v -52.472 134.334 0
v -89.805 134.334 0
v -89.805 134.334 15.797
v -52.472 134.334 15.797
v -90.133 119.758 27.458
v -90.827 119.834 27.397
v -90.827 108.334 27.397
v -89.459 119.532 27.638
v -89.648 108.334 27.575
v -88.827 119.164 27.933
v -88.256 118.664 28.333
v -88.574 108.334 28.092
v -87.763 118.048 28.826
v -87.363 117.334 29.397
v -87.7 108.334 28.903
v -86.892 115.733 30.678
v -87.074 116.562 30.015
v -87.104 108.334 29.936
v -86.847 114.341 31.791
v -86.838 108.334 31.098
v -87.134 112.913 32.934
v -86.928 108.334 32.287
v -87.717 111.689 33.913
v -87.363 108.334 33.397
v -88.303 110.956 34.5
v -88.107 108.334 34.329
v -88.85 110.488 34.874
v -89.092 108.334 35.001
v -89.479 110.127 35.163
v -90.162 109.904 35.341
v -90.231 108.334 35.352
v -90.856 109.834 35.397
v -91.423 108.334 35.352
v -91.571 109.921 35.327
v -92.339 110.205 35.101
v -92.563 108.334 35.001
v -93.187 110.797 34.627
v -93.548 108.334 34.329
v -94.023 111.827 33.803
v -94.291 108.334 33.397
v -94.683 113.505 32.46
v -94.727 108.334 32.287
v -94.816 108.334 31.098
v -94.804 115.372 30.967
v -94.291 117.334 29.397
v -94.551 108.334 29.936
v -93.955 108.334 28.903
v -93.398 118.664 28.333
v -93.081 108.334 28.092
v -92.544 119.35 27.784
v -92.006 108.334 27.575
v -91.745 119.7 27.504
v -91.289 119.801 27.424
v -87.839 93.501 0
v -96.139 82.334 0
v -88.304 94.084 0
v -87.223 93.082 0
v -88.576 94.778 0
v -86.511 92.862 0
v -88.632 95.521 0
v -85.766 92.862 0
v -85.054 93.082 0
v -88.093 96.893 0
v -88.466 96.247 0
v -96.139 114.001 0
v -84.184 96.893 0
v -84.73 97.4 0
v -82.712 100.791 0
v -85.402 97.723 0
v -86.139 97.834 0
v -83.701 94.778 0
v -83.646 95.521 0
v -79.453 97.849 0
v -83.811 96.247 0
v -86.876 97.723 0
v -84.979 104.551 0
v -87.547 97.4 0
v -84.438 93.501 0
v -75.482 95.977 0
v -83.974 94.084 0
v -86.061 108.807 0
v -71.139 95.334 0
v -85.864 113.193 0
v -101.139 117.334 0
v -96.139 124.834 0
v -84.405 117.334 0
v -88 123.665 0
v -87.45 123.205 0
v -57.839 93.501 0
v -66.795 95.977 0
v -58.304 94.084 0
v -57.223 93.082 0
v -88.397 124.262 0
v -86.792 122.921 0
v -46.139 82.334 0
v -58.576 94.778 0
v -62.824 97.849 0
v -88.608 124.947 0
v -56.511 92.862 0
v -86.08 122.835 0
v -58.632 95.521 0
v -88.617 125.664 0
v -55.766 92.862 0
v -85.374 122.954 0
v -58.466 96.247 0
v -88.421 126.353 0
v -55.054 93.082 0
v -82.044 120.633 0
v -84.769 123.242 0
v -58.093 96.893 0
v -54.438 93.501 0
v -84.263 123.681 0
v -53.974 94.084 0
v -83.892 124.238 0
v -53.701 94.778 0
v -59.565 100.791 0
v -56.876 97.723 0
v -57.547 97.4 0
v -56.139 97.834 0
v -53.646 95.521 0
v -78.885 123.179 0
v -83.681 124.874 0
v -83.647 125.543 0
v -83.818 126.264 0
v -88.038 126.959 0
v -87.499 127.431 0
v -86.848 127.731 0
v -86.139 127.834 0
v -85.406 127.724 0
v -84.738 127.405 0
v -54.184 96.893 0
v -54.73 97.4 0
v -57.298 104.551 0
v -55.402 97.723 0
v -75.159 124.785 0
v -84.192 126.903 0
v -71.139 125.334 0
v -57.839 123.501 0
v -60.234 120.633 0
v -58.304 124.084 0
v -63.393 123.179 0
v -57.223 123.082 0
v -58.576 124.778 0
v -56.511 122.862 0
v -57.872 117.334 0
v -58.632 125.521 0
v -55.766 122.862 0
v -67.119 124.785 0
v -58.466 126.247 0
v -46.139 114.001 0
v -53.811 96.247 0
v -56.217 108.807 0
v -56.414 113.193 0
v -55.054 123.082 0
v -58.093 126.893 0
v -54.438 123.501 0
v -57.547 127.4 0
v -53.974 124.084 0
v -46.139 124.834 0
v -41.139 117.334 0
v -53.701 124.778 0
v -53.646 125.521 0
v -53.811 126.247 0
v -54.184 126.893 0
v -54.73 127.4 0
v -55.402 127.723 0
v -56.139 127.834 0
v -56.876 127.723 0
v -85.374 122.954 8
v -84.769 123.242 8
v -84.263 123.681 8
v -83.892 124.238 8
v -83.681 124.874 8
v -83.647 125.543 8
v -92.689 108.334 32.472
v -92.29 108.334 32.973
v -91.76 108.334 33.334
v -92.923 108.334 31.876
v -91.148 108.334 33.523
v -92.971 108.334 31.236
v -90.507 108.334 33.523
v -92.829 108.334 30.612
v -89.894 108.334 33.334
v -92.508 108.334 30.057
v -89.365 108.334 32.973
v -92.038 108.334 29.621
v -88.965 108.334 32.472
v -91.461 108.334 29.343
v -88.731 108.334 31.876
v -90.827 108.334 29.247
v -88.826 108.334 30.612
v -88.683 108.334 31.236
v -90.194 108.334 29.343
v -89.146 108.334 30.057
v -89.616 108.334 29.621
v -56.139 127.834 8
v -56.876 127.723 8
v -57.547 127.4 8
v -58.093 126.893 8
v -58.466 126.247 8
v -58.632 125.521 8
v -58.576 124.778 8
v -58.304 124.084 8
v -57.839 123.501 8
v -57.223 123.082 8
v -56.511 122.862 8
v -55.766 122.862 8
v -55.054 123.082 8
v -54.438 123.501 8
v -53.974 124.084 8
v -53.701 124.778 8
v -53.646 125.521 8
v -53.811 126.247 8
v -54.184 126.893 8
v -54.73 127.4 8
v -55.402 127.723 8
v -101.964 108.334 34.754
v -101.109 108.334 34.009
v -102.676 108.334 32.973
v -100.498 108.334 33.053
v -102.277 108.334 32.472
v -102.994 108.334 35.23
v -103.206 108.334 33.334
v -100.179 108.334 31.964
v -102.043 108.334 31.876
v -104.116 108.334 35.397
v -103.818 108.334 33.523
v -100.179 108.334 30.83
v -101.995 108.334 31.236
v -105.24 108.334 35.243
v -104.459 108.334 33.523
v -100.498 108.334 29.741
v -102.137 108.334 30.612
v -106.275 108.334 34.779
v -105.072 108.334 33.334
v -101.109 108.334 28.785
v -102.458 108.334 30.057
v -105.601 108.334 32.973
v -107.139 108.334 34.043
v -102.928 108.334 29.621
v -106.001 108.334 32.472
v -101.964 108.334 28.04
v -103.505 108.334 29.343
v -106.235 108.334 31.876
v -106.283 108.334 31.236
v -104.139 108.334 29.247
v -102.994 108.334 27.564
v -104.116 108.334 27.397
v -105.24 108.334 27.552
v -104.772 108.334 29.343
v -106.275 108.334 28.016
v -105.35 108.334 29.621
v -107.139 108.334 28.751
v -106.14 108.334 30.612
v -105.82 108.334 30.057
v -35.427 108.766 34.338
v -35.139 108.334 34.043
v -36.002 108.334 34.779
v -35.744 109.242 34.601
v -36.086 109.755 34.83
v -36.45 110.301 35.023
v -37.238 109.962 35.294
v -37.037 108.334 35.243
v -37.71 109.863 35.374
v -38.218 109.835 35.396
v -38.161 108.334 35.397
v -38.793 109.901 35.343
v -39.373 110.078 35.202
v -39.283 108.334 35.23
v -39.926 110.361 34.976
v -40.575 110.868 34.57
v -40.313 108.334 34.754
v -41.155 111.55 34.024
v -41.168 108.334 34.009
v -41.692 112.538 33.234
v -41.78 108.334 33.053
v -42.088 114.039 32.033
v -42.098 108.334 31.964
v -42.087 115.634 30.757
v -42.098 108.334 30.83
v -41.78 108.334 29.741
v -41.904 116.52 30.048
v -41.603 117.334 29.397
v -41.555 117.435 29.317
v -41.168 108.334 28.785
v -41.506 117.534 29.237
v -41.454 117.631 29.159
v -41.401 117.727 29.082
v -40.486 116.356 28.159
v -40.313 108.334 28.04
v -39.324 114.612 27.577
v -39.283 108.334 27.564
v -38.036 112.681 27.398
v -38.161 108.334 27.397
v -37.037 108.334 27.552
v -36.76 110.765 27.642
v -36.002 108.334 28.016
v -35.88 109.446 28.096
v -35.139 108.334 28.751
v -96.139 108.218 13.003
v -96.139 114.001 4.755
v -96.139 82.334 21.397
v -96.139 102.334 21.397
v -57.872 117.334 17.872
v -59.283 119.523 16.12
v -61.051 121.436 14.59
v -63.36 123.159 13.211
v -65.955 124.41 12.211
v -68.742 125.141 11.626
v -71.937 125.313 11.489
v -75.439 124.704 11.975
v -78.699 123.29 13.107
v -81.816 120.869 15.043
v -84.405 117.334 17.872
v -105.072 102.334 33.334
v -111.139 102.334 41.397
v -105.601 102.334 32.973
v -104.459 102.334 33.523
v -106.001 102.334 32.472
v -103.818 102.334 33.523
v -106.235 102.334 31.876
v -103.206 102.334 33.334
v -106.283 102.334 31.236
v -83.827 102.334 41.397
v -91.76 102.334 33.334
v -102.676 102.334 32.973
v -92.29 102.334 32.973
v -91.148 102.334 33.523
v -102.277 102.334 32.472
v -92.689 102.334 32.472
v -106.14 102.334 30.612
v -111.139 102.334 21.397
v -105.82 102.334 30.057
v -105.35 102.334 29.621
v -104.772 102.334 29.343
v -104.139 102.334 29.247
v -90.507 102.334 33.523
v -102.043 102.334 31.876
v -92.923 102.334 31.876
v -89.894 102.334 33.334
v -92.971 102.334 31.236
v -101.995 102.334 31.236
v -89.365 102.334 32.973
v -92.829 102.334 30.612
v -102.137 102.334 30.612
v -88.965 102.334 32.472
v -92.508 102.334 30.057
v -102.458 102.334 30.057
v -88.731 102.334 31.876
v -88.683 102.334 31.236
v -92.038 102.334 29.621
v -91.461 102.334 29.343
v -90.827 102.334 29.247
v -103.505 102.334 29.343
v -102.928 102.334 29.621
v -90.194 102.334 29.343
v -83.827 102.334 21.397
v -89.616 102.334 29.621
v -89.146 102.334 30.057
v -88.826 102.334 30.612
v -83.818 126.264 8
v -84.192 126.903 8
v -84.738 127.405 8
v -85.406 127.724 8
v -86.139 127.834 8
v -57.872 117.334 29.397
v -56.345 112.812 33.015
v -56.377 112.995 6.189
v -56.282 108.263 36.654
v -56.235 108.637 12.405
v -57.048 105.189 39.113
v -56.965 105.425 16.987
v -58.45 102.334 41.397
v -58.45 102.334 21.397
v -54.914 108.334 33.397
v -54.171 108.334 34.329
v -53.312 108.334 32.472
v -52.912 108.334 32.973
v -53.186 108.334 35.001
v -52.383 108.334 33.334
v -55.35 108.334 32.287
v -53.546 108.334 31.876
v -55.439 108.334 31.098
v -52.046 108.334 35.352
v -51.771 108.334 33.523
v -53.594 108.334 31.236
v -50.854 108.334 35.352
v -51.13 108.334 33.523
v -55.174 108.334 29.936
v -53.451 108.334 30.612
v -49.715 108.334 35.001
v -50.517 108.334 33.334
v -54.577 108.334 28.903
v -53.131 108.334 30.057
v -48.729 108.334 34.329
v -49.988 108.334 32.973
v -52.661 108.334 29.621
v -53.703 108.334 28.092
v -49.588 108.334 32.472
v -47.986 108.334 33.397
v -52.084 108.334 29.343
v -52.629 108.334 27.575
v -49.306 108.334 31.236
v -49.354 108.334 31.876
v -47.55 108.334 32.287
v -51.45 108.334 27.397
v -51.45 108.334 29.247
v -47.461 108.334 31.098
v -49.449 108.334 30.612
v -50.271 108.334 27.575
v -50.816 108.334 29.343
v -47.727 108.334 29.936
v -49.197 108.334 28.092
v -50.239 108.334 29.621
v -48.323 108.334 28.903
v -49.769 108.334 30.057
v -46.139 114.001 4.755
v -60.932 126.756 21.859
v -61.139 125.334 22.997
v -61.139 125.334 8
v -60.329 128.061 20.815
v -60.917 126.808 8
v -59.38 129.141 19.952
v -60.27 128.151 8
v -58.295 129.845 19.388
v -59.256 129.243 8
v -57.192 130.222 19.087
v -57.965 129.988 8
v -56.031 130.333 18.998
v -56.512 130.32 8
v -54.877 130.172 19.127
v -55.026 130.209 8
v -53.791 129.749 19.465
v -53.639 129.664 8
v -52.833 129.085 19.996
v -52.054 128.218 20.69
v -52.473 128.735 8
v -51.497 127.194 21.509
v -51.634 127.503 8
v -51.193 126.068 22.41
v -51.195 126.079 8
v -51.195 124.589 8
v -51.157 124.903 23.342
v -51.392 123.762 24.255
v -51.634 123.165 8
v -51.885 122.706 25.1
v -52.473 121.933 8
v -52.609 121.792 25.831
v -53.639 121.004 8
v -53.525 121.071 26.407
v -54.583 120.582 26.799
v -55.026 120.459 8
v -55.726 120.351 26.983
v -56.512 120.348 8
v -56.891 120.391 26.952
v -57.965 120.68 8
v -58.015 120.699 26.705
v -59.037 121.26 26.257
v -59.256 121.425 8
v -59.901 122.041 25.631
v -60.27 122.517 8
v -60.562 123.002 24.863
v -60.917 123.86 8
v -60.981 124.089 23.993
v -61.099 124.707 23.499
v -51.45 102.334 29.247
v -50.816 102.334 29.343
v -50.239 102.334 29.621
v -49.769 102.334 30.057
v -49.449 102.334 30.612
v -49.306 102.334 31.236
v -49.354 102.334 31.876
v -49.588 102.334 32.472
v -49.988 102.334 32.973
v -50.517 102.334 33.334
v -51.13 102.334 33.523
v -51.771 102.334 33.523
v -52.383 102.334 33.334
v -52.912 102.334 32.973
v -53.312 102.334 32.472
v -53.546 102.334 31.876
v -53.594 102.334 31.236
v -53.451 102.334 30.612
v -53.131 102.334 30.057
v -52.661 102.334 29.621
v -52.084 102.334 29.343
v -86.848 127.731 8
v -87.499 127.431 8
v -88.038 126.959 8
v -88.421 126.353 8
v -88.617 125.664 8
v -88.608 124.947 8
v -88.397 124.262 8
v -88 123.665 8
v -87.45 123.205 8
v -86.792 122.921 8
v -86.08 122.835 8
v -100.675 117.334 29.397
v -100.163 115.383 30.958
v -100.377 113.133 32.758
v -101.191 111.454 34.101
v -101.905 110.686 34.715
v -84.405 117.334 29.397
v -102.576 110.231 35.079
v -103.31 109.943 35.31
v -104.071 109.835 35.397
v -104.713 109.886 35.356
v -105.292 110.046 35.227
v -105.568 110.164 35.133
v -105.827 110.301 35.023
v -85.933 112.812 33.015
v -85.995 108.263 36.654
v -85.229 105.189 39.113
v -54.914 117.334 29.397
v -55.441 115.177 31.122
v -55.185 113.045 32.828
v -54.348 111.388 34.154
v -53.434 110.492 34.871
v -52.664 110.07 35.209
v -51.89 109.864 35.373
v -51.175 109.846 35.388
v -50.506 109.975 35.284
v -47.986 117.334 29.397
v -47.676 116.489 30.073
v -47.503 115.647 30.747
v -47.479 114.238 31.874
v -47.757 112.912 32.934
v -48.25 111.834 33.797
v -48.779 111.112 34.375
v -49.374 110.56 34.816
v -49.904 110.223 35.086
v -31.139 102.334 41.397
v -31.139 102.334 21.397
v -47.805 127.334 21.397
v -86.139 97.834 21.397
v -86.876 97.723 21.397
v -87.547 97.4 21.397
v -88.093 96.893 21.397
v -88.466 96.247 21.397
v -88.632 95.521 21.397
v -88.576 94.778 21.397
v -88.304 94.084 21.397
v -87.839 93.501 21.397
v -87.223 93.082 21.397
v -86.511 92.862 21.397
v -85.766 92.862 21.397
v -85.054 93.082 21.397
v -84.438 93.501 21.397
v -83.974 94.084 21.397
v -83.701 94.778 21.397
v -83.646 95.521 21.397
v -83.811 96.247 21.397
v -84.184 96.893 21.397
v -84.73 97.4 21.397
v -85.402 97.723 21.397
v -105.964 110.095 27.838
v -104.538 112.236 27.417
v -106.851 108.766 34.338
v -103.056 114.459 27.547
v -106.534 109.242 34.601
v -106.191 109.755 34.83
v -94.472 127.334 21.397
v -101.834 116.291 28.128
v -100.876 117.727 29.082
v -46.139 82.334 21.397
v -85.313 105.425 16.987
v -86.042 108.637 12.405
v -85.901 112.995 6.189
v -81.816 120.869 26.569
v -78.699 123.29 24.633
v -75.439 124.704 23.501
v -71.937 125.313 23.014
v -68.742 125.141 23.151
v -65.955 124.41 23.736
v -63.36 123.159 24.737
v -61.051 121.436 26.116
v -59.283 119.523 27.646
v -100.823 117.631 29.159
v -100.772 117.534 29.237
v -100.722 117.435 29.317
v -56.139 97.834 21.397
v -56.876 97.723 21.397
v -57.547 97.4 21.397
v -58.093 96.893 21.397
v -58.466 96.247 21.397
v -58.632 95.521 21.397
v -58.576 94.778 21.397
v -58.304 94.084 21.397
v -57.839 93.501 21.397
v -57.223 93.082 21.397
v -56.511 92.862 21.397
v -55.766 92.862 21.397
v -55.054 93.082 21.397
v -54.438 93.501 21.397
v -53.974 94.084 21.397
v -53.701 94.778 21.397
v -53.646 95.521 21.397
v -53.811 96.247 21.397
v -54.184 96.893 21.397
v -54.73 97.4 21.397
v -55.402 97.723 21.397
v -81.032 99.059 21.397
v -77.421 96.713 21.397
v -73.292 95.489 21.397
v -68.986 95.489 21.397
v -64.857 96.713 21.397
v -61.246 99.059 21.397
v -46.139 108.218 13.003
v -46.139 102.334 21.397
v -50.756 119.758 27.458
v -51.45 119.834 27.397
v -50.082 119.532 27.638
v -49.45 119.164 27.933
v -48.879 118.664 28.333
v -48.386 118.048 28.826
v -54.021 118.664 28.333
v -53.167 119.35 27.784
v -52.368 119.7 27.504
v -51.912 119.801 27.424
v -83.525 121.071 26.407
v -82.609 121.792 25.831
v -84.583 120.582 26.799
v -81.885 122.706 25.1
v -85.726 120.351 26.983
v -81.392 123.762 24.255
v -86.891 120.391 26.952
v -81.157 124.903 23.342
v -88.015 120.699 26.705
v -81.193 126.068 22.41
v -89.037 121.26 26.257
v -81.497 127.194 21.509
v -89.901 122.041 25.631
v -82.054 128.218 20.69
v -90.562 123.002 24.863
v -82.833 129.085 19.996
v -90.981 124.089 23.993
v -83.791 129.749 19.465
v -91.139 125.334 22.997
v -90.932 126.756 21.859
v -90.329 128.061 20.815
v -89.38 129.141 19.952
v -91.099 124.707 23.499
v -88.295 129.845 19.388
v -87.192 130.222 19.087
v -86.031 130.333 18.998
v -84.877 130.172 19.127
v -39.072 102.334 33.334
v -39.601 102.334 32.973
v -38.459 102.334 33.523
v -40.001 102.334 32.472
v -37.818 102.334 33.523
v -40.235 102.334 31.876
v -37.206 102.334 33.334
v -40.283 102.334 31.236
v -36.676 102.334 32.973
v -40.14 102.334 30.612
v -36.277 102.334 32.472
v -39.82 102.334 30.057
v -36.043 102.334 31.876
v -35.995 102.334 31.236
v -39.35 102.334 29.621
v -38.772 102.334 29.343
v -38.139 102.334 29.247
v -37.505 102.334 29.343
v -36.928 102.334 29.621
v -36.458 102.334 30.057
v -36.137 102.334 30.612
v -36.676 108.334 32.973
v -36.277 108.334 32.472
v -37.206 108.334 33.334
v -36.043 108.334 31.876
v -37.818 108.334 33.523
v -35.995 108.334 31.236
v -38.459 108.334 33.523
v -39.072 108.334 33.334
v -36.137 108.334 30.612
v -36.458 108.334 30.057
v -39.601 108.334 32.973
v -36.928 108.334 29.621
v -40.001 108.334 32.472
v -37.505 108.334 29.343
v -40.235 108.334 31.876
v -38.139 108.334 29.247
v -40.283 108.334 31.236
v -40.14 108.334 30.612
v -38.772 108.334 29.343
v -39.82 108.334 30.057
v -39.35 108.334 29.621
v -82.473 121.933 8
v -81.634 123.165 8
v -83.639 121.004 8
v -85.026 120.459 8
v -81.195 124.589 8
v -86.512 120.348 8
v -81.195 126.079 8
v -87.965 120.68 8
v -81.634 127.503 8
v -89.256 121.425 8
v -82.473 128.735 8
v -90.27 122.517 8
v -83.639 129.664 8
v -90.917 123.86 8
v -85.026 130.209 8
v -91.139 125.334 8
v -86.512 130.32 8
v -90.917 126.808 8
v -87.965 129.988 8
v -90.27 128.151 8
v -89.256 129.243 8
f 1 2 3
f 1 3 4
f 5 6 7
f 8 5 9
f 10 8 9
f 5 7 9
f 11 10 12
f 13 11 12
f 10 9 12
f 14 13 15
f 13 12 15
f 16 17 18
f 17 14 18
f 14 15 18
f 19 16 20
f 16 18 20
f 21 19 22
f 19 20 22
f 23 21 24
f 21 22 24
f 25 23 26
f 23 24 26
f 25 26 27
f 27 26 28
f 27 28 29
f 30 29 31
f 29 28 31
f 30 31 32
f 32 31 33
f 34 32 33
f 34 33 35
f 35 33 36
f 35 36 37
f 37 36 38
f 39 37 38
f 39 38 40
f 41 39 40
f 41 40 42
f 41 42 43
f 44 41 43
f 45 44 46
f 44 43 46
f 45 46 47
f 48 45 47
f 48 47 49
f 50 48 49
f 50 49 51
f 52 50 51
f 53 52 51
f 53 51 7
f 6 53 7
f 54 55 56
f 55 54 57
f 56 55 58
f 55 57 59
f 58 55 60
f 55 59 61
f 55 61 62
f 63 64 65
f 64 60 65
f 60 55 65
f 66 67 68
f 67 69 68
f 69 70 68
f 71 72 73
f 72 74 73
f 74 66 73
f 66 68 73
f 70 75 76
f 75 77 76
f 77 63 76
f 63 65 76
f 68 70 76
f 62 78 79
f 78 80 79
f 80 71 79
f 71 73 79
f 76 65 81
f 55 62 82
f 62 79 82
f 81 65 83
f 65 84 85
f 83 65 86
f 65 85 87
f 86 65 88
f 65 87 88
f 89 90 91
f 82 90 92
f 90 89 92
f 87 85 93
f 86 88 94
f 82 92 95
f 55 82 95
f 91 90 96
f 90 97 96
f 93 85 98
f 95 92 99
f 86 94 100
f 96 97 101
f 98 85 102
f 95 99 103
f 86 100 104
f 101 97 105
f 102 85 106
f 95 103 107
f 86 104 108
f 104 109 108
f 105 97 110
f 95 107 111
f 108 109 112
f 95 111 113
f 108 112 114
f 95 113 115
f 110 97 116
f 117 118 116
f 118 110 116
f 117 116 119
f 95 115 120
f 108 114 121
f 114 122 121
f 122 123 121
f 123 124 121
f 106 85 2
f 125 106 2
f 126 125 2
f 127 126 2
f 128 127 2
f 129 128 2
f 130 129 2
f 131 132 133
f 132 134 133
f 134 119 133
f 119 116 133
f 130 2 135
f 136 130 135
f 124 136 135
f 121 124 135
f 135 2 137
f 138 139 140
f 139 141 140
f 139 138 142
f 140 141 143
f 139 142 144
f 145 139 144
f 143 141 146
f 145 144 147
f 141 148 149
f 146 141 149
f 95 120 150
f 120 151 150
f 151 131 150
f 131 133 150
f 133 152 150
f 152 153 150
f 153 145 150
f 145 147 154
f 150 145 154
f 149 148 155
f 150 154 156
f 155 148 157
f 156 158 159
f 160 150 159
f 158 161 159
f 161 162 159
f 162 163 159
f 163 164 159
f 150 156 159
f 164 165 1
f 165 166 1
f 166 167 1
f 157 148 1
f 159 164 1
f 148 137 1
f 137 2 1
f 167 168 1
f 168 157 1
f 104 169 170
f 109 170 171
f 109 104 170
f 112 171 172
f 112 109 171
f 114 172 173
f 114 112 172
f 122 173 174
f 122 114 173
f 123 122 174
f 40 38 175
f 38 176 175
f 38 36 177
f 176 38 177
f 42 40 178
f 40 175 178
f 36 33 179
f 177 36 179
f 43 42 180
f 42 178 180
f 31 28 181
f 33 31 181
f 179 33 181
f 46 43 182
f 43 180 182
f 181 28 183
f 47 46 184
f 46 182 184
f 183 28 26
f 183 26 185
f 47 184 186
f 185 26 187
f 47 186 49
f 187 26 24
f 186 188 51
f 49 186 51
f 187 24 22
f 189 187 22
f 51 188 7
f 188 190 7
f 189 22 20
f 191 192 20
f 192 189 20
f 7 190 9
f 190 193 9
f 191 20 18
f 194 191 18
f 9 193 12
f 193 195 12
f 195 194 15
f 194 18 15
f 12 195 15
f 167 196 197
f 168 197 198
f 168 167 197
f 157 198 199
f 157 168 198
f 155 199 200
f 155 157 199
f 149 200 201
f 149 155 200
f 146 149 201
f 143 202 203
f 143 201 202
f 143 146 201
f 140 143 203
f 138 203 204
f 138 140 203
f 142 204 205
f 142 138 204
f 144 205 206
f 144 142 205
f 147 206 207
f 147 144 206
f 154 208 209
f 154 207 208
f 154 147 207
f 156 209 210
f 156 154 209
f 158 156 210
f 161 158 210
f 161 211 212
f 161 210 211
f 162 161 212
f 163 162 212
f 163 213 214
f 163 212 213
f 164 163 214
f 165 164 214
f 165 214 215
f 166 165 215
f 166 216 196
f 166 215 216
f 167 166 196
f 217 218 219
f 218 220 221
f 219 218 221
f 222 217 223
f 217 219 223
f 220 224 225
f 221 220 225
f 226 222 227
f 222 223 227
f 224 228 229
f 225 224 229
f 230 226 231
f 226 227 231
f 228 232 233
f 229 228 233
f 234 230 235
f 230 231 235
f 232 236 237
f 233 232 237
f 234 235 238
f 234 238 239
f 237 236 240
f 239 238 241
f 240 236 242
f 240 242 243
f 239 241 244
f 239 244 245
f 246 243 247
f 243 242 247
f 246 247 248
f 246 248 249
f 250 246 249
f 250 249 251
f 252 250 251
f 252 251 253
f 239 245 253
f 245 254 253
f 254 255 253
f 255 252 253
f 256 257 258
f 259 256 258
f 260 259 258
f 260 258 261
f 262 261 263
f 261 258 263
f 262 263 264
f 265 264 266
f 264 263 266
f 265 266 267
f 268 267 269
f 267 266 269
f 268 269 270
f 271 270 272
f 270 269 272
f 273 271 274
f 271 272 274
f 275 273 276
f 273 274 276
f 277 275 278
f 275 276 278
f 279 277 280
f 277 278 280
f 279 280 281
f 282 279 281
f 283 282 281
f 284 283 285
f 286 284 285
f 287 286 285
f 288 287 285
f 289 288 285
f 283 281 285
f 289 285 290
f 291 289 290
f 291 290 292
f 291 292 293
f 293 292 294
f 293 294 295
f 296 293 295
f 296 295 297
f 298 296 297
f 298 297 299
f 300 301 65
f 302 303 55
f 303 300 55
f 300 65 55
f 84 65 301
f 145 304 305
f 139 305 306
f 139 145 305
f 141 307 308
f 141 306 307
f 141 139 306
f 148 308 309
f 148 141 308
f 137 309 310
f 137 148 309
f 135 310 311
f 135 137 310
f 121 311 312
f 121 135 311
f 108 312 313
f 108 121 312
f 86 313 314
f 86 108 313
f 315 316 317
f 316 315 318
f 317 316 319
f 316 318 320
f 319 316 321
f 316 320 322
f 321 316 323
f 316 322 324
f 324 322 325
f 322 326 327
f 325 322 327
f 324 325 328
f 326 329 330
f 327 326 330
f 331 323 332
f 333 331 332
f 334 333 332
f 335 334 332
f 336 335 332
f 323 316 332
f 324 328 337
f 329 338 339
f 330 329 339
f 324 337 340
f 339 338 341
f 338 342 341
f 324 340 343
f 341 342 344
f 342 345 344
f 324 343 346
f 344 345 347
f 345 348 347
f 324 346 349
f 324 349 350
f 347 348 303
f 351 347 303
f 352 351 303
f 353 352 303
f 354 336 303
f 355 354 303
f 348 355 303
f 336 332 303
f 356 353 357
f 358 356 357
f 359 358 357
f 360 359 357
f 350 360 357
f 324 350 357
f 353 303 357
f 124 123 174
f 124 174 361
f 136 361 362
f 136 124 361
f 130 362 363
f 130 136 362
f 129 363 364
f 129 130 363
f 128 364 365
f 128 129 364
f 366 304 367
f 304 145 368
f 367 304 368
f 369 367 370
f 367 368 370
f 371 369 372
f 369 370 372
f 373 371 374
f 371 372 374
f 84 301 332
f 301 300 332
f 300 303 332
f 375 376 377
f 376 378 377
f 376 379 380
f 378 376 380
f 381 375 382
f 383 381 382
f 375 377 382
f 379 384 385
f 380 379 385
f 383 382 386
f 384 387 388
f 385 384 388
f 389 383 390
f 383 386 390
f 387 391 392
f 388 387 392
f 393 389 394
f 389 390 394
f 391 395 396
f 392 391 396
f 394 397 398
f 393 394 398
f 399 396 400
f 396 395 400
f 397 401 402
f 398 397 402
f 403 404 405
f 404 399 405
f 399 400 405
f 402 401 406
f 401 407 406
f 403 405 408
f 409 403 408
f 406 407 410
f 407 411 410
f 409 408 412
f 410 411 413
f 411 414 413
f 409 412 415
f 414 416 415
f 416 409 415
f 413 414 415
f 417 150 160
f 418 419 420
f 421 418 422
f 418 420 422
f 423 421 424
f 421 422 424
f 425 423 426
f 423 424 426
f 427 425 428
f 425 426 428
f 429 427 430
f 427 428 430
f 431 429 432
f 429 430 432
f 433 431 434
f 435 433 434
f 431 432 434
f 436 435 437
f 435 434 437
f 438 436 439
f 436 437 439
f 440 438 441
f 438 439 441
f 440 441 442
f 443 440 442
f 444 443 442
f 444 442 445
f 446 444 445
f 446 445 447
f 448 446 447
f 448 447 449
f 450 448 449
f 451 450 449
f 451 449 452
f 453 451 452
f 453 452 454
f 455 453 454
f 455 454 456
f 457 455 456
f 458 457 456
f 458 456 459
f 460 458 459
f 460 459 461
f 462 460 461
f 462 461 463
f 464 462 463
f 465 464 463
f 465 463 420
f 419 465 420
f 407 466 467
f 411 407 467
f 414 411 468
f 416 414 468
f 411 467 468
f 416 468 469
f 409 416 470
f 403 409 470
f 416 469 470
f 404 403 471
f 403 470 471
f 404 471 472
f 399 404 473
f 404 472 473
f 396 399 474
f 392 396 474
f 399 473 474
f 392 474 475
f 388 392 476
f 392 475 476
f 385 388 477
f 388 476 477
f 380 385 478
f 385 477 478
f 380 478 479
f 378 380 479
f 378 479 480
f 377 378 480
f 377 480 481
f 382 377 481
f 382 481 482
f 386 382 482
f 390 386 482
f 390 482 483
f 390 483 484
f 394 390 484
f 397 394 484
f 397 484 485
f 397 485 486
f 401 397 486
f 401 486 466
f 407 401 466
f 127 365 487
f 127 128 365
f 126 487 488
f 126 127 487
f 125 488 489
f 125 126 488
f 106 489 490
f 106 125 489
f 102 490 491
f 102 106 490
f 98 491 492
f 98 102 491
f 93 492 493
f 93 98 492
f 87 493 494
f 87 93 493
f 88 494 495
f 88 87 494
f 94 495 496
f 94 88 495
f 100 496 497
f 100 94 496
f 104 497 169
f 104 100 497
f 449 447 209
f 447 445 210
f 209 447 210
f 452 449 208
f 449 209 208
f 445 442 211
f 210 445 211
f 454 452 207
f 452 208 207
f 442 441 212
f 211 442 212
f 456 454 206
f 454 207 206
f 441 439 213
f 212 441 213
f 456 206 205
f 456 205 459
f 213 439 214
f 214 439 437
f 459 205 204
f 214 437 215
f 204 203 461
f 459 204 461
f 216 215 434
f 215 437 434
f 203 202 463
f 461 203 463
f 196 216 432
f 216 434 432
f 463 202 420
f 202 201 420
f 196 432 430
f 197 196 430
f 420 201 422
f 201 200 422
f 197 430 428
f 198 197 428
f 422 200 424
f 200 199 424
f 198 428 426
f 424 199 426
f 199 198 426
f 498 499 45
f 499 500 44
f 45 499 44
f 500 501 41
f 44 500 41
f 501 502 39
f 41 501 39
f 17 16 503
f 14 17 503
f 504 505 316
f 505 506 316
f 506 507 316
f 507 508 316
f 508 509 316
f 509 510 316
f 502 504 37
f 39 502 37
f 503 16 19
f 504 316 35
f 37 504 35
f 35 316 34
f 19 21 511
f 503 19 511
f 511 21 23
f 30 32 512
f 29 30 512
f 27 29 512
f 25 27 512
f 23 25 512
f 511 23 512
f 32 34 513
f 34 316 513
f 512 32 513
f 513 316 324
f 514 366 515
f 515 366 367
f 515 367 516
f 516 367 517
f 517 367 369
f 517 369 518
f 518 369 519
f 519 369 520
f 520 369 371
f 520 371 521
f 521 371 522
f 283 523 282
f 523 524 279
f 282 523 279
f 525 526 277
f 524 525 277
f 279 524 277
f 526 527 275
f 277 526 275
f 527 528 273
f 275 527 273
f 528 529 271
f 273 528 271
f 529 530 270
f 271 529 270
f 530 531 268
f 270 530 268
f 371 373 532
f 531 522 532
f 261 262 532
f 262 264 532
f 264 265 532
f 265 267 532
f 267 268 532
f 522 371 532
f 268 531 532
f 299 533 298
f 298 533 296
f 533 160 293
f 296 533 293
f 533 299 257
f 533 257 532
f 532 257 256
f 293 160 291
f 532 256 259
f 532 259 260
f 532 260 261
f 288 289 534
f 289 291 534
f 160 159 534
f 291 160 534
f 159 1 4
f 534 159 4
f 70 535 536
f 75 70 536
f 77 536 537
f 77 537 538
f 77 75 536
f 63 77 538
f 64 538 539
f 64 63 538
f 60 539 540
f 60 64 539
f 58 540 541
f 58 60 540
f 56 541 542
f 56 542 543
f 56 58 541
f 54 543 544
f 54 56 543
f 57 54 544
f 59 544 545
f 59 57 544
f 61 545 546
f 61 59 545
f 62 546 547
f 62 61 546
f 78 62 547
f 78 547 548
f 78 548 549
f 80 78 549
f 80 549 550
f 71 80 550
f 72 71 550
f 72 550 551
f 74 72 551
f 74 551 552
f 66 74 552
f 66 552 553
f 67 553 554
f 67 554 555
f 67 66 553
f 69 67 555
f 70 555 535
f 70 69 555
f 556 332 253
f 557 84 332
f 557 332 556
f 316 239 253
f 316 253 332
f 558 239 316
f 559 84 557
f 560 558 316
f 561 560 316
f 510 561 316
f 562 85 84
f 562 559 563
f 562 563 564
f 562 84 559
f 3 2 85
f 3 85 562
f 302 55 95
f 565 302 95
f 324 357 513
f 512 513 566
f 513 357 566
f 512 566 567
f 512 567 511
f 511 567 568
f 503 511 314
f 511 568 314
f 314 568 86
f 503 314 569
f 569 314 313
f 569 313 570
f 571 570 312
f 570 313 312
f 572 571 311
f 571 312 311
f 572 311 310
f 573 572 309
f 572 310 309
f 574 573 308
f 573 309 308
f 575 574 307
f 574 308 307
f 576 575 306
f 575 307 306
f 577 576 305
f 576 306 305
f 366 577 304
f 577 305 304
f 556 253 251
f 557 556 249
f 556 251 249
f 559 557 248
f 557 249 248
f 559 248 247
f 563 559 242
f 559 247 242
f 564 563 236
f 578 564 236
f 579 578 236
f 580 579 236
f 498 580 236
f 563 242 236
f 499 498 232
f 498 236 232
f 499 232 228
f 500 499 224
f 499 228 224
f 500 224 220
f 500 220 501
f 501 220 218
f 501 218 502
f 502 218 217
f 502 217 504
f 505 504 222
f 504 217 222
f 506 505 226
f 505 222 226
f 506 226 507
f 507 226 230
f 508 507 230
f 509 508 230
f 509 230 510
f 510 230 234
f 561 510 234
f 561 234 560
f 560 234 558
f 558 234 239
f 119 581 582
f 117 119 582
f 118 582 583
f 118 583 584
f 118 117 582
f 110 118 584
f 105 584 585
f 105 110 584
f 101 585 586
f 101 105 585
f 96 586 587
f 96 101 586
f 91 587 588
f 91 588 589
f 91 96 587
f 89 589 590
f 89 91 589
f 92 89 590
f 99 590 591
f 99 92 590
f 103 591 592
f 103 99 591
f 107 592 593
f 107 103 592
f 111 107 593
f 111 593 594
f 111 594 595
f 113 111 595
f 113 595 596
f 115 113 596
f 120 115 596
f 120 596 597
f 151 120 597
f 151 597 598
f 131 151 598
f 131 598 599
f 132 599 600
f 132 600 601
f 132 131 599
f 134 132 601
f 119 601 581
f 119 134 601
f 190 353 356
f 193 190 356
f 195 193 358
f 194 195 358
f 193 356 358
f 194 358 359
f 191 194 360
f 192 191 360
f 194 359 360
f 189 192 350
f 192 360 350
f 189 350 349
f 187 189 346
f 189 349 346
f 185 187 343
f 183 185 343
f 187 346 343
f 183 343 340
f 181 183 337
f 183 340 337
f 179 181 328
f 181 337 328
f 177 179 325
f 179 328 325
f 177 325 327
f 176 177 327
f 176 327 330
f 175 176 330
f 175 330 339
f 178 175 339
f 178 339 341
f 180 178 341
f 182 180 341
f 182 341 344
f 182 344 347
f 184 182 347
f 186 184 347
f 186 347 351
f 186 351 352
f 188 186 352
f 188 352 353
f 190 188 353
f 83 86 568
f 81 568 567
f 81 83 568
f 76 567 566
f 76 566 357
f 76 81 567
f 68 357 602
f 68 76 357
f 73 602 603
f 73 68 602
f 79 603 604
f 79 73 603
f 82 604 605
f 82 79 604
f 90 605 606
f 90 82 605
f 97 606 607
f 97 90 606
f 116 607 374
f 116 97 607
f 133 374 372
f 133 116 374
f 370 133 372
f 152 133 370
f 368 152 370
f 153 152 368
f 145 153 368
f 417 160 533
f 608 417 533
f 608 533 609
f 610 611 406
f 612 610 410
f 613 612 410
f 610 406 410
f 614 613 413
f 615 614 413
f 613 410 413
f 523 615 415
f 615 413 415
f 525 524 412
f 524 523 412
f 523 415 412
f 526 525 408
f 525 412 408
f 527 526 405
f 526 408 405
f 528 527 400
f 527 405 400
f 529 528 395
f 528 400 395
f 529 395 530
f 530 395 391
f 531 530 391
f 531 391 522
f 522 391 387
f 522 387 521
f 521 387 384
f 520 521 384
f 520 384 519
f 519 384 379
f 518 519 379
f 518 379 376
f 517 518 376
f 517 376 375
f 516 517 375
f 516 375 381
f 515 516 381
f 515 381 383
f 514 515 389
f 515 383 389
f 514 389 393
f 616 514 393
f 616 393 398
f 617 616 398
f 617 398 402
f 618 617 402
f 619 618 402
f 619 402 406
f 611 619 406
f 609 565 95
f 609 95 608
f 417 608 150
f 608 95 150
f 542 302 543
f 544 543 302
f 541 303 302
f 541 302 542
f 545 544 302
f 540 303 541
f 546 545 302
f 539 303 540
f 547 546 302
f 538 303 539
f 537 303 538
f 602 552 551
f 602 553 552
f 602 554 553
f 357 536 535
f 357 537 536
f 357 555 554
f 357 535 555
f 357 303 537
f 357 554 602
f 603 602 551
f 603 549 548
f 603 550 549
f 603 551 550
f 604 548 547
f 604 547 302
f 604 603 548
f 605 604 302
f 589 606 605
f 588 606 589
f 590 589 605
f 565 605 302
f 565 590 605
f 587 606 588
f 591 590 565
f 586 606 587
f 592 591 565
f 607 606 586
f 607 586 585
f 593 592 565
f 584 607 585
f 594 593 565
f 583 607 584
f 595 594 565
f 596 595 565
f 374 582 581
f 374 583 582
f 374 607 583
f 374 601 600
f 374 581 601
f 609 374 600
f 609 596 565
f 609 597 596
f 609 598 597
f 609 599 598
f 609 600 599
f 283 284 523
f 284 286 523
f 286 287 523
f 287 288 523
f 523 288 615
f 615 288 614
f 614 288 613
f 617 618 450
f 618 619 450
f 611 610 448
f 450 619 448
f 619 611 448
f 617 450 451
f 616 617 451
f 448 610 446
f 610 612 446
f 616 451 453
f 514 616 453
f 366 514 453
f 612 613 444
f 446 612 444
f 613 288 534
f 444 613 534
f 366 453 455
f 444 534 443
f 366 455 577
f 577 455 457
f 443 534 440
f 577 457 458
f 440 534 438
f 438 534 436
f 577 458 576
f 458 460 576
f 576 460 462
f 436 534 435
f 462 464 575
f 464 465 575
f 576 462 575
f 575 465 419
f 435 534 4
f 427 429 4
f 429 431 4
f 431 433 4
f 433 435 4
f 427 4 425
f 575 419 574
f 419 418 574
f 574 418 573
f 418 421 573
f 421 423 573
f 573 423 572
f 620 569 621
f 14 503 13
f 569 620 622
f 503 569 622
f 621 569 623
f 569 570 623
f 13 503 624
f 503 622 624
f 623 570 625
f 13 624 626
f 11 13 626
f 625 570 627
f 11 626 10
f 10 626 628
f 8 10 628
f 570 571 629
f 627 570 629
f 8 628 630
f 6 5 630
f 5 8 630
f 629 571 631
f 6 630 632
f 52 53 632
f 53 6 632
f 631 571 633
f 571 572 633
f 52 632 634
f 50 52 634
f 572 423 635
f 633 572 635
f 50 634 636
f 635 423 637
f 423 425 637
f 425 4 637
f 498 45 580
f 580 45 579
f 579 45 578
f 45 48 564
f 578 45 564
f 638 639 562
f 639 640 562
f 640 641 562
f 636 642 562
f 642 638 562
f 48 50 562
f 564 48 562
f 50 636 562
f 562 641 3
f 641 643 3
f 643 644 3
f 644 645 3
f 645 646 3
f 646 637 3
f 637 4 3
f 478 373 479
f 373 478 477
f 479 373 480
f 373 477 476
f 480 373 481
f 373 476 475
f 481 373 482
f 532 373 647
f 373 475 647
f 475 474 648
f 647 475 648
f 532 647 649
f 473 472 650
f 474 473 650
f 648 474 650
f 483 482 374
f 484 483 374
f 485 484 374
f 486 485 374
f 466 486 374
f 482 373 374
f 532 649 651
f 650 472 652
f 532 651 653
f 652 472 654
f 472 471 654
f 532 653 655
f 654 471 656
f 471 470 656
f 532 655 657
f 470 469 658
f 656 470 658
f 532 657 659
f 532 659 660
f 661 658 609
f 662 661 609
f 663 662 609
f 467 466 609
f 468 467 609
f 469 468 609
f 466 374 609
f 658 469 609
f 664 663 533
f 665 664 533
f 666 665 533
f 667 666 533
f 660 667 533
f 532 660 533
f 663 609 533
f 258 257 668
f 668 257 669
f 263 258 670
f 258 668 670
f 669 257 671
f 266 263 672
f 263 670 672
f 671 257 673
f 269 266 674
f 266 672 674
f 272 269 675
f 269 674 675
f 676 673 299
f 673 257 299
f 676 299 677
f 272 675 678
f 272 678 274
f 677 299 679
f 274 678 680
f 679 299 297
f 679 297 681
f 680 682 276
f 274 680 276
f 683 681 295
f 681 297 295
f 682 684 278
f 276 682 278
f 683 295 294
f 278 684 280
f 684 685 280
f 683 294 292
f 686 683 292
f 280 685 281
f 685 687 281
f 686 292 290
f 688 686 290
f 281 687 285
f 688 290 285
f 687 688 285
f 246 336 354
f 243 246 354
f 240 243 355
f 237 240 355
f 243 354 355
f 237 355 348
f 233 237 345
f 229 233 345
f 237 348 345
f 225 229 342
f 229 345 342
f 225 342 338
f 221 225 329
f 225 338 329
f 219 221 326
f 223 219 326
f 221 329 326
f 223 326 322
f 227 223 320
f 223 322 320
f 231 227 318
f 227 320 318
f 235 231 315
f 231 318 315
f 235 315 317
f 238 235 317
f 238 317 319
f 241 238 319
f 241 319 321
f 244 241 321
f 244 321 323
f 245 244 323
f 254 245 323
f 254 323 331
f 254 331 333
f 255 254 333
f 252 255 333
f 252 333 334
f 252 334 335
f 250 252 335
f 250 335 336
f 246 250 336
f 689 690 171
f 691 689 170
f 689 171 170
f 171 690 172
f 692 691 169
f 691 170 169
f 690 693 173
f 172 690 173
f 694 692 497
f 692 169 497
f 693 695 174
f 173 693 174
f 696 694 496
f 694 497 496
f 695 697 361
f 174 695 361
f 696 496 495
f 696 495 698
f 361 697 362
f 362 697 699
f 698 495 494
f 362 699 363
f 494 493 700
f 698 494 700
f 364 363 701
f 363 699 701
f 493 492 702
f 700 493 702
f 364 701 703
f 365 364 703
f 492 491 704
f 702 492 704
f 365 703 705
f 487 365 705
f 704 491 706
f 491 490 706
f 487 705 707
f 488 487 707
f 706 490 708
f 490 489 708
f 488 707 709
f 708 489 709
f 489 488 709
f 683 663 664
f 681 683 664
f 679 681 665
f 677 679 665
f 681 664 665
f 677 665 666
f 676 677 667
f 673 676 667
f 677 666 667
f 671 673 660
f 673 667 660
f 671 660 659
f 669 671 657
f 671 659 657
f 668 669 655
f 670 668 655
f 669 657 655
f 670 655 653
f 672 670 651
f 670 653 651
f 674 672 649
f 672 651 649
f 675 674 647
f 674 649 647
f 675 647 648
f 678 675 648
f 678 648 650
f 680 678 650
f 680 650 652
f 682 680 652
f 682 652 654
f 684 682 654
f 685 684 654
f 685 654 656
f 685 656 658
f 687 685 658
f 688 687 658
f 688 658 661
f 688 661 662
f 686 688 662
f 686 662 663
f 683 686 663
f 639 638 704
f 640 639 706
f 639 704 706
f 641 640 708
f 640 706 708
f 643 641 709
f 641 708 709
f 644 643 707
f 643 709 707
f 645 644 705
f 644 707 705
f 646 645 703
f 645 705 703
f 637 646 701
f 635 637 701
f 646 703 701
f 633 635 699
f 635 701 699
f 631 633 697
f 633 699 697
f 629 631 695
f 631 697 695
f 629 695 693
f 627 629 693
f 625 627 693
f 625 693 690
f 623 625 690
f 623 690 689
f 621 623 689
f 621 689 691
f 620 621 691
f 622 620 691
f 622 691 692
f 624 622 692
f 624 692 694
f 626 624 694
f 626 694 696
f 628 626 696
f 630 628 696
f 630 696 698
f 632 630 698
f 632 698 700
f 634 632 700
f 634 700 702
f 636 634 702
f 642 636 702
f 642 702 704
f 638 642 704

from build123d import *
from build123d.topology import SkipClean

# Parameters (mm, degrees)
EXTRUDE1_DEPTH  = 21.397127
SKETCH4_W       = 60
SKETCH4_H       = 29.397126503
SKETCH3_W       = 80
SKETCH3_H       = 20
EXTRUDE2_DEPTH  = 10
EXTRUDE3_DEPTH  = 9
SKETCH7_W       = 60.014196904
SKETCH7_H       = 26.778889024
EXTRUDE4_DEPTH  = 11
SKETCH8_W       = 71.467077652
SKETCH8_H       = 25.017155062
EXTRUDE5_DEPTH  = 23
SKETCH9_W       = 59.977554146
SKETCH9_H       = 30.874003366
EXTRUDE6_DEPTH  = 7
SKETCH10_R      = 2.5
EXTRUDE7_DEPTH  = 65
SKETCH12_R      = 5
EXTRUDE8_DEPTH  = 65
SKETCH13_R      = 2.15
EXTRUDE9_DEPTH  = 65
SKETCH14_R      = 4
EXTRUDE10_DEPTH = 65


with BuildPart() as part:
    # Sketch1 → Extrude1 (new body)
    with BuildSketch(Plane.XY):
        with BuildLine():
            Line((-96.138674094, 82.333988555), (-46.138674094, 82.333988555))
            Line((-46.138674094, 82.333988555), (-46.138674094, 131.333988555))
            ThreePointArc((-46.138674094, 131.333988555), (-47.017353751, 133.455308898), (-49.138674094, 134.333988555))
            Line((-49.138674094, 134.333988555), (-93.138674094, 134.333988555))
            ThreePointArc((-93.138674094, 134.333988555), (-95.259994438, 133.455308898), (-96.138674094, 131.333988555))
            Line((-96.138674094, 131.333988555), (-96.138674094, 82.333988555))
        make_face()
        with BuildLine():
            ThreePointArc((-86.138674094, 92.833988555), (-83.638674094, 95.333988555), (-86.138674094, 97.833988555))
            ThreePointArc((-86.138674094, 97.833988555), (-88.638674094, 95.333988555), (-86.138674094, 92.833988555))
        make_face(mode=Mode.SUBTRACT)
        with BuildLine():
            ThreePointArc((-56.138674094, 92.833988555), (-53.638674094, 95.333988555), (-56.138674094, 97.833988555))
            ThreePointArc((-56.138674094, 97.833988555), (-58.638674094, 95.333988555), (-56.138674094, 92.833988555))
        make_face(mode=Mode.SUBTRACT)
        with BuildLine():
            ThreePointArc((-86.138674094, 127.833988555), (-88.638674094, 125.333988555), (-86.138674094, 122.833988555))
            ThreePointArc((-86.138674094, 122.833988555), (-83.638674094, 125.333988555), (-86.138674094, 127.833988555))
        make_face(mode=Mode.SUBTRACT)
        with BuildLine():
            ThreePointArc((-56.138674094, 122.833988555), (-53.638674094, 125.333988555), (-56.138674094, 127.833988555))
            ThreePointArc((-56.138674094, 127.833988555), (-58.638674094, 125.333988555), (-56.138674094, 122.833988555))
        make_face(mode=Mode.SUBTRACT)
        with BuildLine():
            ThreePointArc((-71.138674094, 125.333988555), (-86.138674094, 110.333988555), (-71.138674094, 95.333988555))
            ThreePointArc((-71.138674094, 95.333988555), (-56.138674094, 110.333988555), (-71.138674094, 125.333988555))
        make_face(mode=Mode.SUBTRACT)
    extrude(amount=EXTRUDE1_DEPTH)

    # Sketch4 → Loft1 section 0
    with BuildSketch(Plane(origin=(0, 117.333988555, 0), x_dir=(1, 0, 0), z_dir=(0, 1, 0))):
        with Locations((-71.138674094, -14.698563252)):
            Rectangle(SKETCH4_W, SKETCH4_H)
    # Sketch3 → Loft1 section 1
    with BuildSketch(Plane(origin=(0, 102.333988555, 0), x_dir=(1, 0, 0), z_dir=(0, 1, 0))):
        with Locations((-71.138674094, -31.397126503)):
            Rectangle(SKETCH3_W, SKETCH3_H)
    loft()

    # Sketch5 → Extrude2 (add)
    with BuildSketch(Plane(origin=(25.673528037, 17.115685358, 0), x_dir=(0, 0, -1), z_dir=(0.8320502943378439, 0.5547001962252289, 0))):
        Polygon((-29.397126503, 120.447410305), (-15.115551494, 141.902806552), (0, 141.902806552), (0, 120.447410305), align=None)
    extrude2 = extrude(amount=-EXTRUDE2_DEPTH)

    # Mirror1: Extrude2 across plane
    add(extrude2.mirror(Plane(origin=(-71.138674094, 0, 0), x_dir=(0, 0, 1), z_dir=(1, 0, 0))))

    # Sketch6 → Extrude3 (add)
    with BuildSketch(Plane(origin=(0, 60.128935291, 75.161169114), x_dir=(1, 0, 0), z_dir=(0, 0.6246950475544204, 0.7808688094430335))):
        Polygon((-101.138674094, 73.258212611), (-85.265778398, 103.749049557), (-57.011569791, 103.749049557), (-41.138674094, 73.258212611), align=None)
    extrude(amount=-EXTRUDE3_DEPTH)

    # Sketch7 → Extrude4 (cut)
    with BuildSketch(Plane(origin=(0, 60.128935291, 75.161169114), x_dir=(1, 0, 0), z_dir=(0, 0.6246950475544204, 0.7808688094430335))):
        with Locations((-68.308122793, 89.258337759)):
            Rectangle(SKETCH7_W, SKETCH7_H)
    extrude(amount=EXTRUDE4_DEPTH, mode=Mode.SUBTRACT)

    # Sketch8 → Extrude5 (cut)
    with BuildSketch(Plane(origin=(-124.173230629, 82.782153753, 0), x_dir=(0, 0, 1), z_dir=(-0.8320502943378424, 0.554700196225231, 1.5396023240333535e-15))):
        with Locations((13.757489511, 55.477649782)):
            Rectangle(SKETCH8_W, SKETCH8_H)
    extrude5 = extrude(amount=EXTRUDE5_DEPTH, mode=Mode.SUBTRACT)

    # Mirror2: Extrude5 across plane
    add(extrude5.mirror(Plane(origin=(-71.138674094, 0, 0), x_dir=(0, 0, 1), z_dir=(1, 0, 0))), mode=Mode.SUBTRACT)

    # Sketch9 → Extrude6 (cut)
    with BuildSketch(Plane(origin=(0, 134.333988555, 0), x_dir=(1, 0, 0), z_dir=(0, 1, 0))):
        with Locations((-70.004468298, -10.685148069)):
            Rectangle(SKETCH9_W, SKETCH9_H)
    extrude(amount=EXTRUDE6_DEPTH, mode=Mode.SUBTRACT)

    # Sketch10 → Extrude7 (cut)
    with SkipClean():  # the faces are left unmerged after this step: merging them gives an invalid solid
        with BuildSketch(Plane(origin=(0, 0, 0), x_dir=(-1, 0, 0), z_dir=(0, 0, -1))):
            with BuildLine():
                ThreePointArc((84.405173256, 117.333988555), (71.138674094, 125.333988555), (57.872174933, 117.333988555))
                ThreePointArc((57.872174933, 117.333988555), (56.149794828, 109.756495394), (58.450096554, 102.333988555))
                ThreePointArc((58.450096554, 102.333988555), (78.644238587, 97.346821748), (84.405173256, 117.333988555))
            make_face()
            with Locations(Location((56.138674094, 125.333988555, 0), (0, 0, 90))):
                Circle(SKETCH10_R)
            with Locations(Location((86.138674094, 125.333988555, 0), (0, 0, 90))):
                Circle(SKETCH10_R)
        extrude(amount=-EXTRUDE7_DEPTH, mode=Mode.SUBTRACT)

    # Sketch12 → Extrude8 (cut)
    with SkipClean():  # the faces are left unmerged after this step: merging them gives an invalid solid
        with BuildSketch(Plane(origin=(0, 0, 8), x_dir=(-1, 0, 0), z_dir=(0, 0, -1))):
            with Locations((86.138674094, 125.333988555)):
                Circle(SKETCH12_R)
            with Locations((56.138674094, 125.333988555)):
                Circle(SKETCH12_R)
        extrude(amount=-EXTRUDE8_DEPTH, mode=Mode.SUBTRACT)

    # Sketch13 → Extrude9 (cut)
    with BuildSketch(Plane.XZ.offset(-102.333988555)):
        with Locations(Location((-104.138674094, 31.397126503, 0), (0, 0, 270))):
            Circle(SKETCH13_R)
        with Locations(Location((-90.827251635, 31.397126503, 0), (0, 0, 270))):
            Circle(SKETCH13_R)
        with Locations(Location((-51.450096554, 31.397126503, 0), (0, 0, 270))):
            Circle(SKETCH13_R)
        with Locations(Location((-38.138674094, 31.397126503, 0), (0, 0, 270))):
            Circle(SKETCH13_R)
    extrude(amount=-EXTRUDE9_DEPTH, mode=Mode.SUBTRACT)

    # Sketch14 → Extrude10 (cut)
    with BuildSketch(Plane(origin=(0, 108.333988555, 0), x_dir=(-1, 0, 0), z_dir=(0, -1, 0))):
        with Locations((104.138674094, -31.397126503)):
            Circle(SKETCH14_R)
        with Locations(Location((90.827251635, -31.397126503, 0), (0, 0, 90))):
            Circle(SKETCH14_R)
        with Locations(Location((51.450096554, -31.397126503, 0), (0, 0, 90))):
            Circle(SKETCH14_R)
        with Locations((38.138674094, -31.397126503)):
            Circle(SKETCH14_R)
    extrude(amount=-EXTRUDE10_DEPTH, mode=Mode.SUBTRACT)


solid = part.part
